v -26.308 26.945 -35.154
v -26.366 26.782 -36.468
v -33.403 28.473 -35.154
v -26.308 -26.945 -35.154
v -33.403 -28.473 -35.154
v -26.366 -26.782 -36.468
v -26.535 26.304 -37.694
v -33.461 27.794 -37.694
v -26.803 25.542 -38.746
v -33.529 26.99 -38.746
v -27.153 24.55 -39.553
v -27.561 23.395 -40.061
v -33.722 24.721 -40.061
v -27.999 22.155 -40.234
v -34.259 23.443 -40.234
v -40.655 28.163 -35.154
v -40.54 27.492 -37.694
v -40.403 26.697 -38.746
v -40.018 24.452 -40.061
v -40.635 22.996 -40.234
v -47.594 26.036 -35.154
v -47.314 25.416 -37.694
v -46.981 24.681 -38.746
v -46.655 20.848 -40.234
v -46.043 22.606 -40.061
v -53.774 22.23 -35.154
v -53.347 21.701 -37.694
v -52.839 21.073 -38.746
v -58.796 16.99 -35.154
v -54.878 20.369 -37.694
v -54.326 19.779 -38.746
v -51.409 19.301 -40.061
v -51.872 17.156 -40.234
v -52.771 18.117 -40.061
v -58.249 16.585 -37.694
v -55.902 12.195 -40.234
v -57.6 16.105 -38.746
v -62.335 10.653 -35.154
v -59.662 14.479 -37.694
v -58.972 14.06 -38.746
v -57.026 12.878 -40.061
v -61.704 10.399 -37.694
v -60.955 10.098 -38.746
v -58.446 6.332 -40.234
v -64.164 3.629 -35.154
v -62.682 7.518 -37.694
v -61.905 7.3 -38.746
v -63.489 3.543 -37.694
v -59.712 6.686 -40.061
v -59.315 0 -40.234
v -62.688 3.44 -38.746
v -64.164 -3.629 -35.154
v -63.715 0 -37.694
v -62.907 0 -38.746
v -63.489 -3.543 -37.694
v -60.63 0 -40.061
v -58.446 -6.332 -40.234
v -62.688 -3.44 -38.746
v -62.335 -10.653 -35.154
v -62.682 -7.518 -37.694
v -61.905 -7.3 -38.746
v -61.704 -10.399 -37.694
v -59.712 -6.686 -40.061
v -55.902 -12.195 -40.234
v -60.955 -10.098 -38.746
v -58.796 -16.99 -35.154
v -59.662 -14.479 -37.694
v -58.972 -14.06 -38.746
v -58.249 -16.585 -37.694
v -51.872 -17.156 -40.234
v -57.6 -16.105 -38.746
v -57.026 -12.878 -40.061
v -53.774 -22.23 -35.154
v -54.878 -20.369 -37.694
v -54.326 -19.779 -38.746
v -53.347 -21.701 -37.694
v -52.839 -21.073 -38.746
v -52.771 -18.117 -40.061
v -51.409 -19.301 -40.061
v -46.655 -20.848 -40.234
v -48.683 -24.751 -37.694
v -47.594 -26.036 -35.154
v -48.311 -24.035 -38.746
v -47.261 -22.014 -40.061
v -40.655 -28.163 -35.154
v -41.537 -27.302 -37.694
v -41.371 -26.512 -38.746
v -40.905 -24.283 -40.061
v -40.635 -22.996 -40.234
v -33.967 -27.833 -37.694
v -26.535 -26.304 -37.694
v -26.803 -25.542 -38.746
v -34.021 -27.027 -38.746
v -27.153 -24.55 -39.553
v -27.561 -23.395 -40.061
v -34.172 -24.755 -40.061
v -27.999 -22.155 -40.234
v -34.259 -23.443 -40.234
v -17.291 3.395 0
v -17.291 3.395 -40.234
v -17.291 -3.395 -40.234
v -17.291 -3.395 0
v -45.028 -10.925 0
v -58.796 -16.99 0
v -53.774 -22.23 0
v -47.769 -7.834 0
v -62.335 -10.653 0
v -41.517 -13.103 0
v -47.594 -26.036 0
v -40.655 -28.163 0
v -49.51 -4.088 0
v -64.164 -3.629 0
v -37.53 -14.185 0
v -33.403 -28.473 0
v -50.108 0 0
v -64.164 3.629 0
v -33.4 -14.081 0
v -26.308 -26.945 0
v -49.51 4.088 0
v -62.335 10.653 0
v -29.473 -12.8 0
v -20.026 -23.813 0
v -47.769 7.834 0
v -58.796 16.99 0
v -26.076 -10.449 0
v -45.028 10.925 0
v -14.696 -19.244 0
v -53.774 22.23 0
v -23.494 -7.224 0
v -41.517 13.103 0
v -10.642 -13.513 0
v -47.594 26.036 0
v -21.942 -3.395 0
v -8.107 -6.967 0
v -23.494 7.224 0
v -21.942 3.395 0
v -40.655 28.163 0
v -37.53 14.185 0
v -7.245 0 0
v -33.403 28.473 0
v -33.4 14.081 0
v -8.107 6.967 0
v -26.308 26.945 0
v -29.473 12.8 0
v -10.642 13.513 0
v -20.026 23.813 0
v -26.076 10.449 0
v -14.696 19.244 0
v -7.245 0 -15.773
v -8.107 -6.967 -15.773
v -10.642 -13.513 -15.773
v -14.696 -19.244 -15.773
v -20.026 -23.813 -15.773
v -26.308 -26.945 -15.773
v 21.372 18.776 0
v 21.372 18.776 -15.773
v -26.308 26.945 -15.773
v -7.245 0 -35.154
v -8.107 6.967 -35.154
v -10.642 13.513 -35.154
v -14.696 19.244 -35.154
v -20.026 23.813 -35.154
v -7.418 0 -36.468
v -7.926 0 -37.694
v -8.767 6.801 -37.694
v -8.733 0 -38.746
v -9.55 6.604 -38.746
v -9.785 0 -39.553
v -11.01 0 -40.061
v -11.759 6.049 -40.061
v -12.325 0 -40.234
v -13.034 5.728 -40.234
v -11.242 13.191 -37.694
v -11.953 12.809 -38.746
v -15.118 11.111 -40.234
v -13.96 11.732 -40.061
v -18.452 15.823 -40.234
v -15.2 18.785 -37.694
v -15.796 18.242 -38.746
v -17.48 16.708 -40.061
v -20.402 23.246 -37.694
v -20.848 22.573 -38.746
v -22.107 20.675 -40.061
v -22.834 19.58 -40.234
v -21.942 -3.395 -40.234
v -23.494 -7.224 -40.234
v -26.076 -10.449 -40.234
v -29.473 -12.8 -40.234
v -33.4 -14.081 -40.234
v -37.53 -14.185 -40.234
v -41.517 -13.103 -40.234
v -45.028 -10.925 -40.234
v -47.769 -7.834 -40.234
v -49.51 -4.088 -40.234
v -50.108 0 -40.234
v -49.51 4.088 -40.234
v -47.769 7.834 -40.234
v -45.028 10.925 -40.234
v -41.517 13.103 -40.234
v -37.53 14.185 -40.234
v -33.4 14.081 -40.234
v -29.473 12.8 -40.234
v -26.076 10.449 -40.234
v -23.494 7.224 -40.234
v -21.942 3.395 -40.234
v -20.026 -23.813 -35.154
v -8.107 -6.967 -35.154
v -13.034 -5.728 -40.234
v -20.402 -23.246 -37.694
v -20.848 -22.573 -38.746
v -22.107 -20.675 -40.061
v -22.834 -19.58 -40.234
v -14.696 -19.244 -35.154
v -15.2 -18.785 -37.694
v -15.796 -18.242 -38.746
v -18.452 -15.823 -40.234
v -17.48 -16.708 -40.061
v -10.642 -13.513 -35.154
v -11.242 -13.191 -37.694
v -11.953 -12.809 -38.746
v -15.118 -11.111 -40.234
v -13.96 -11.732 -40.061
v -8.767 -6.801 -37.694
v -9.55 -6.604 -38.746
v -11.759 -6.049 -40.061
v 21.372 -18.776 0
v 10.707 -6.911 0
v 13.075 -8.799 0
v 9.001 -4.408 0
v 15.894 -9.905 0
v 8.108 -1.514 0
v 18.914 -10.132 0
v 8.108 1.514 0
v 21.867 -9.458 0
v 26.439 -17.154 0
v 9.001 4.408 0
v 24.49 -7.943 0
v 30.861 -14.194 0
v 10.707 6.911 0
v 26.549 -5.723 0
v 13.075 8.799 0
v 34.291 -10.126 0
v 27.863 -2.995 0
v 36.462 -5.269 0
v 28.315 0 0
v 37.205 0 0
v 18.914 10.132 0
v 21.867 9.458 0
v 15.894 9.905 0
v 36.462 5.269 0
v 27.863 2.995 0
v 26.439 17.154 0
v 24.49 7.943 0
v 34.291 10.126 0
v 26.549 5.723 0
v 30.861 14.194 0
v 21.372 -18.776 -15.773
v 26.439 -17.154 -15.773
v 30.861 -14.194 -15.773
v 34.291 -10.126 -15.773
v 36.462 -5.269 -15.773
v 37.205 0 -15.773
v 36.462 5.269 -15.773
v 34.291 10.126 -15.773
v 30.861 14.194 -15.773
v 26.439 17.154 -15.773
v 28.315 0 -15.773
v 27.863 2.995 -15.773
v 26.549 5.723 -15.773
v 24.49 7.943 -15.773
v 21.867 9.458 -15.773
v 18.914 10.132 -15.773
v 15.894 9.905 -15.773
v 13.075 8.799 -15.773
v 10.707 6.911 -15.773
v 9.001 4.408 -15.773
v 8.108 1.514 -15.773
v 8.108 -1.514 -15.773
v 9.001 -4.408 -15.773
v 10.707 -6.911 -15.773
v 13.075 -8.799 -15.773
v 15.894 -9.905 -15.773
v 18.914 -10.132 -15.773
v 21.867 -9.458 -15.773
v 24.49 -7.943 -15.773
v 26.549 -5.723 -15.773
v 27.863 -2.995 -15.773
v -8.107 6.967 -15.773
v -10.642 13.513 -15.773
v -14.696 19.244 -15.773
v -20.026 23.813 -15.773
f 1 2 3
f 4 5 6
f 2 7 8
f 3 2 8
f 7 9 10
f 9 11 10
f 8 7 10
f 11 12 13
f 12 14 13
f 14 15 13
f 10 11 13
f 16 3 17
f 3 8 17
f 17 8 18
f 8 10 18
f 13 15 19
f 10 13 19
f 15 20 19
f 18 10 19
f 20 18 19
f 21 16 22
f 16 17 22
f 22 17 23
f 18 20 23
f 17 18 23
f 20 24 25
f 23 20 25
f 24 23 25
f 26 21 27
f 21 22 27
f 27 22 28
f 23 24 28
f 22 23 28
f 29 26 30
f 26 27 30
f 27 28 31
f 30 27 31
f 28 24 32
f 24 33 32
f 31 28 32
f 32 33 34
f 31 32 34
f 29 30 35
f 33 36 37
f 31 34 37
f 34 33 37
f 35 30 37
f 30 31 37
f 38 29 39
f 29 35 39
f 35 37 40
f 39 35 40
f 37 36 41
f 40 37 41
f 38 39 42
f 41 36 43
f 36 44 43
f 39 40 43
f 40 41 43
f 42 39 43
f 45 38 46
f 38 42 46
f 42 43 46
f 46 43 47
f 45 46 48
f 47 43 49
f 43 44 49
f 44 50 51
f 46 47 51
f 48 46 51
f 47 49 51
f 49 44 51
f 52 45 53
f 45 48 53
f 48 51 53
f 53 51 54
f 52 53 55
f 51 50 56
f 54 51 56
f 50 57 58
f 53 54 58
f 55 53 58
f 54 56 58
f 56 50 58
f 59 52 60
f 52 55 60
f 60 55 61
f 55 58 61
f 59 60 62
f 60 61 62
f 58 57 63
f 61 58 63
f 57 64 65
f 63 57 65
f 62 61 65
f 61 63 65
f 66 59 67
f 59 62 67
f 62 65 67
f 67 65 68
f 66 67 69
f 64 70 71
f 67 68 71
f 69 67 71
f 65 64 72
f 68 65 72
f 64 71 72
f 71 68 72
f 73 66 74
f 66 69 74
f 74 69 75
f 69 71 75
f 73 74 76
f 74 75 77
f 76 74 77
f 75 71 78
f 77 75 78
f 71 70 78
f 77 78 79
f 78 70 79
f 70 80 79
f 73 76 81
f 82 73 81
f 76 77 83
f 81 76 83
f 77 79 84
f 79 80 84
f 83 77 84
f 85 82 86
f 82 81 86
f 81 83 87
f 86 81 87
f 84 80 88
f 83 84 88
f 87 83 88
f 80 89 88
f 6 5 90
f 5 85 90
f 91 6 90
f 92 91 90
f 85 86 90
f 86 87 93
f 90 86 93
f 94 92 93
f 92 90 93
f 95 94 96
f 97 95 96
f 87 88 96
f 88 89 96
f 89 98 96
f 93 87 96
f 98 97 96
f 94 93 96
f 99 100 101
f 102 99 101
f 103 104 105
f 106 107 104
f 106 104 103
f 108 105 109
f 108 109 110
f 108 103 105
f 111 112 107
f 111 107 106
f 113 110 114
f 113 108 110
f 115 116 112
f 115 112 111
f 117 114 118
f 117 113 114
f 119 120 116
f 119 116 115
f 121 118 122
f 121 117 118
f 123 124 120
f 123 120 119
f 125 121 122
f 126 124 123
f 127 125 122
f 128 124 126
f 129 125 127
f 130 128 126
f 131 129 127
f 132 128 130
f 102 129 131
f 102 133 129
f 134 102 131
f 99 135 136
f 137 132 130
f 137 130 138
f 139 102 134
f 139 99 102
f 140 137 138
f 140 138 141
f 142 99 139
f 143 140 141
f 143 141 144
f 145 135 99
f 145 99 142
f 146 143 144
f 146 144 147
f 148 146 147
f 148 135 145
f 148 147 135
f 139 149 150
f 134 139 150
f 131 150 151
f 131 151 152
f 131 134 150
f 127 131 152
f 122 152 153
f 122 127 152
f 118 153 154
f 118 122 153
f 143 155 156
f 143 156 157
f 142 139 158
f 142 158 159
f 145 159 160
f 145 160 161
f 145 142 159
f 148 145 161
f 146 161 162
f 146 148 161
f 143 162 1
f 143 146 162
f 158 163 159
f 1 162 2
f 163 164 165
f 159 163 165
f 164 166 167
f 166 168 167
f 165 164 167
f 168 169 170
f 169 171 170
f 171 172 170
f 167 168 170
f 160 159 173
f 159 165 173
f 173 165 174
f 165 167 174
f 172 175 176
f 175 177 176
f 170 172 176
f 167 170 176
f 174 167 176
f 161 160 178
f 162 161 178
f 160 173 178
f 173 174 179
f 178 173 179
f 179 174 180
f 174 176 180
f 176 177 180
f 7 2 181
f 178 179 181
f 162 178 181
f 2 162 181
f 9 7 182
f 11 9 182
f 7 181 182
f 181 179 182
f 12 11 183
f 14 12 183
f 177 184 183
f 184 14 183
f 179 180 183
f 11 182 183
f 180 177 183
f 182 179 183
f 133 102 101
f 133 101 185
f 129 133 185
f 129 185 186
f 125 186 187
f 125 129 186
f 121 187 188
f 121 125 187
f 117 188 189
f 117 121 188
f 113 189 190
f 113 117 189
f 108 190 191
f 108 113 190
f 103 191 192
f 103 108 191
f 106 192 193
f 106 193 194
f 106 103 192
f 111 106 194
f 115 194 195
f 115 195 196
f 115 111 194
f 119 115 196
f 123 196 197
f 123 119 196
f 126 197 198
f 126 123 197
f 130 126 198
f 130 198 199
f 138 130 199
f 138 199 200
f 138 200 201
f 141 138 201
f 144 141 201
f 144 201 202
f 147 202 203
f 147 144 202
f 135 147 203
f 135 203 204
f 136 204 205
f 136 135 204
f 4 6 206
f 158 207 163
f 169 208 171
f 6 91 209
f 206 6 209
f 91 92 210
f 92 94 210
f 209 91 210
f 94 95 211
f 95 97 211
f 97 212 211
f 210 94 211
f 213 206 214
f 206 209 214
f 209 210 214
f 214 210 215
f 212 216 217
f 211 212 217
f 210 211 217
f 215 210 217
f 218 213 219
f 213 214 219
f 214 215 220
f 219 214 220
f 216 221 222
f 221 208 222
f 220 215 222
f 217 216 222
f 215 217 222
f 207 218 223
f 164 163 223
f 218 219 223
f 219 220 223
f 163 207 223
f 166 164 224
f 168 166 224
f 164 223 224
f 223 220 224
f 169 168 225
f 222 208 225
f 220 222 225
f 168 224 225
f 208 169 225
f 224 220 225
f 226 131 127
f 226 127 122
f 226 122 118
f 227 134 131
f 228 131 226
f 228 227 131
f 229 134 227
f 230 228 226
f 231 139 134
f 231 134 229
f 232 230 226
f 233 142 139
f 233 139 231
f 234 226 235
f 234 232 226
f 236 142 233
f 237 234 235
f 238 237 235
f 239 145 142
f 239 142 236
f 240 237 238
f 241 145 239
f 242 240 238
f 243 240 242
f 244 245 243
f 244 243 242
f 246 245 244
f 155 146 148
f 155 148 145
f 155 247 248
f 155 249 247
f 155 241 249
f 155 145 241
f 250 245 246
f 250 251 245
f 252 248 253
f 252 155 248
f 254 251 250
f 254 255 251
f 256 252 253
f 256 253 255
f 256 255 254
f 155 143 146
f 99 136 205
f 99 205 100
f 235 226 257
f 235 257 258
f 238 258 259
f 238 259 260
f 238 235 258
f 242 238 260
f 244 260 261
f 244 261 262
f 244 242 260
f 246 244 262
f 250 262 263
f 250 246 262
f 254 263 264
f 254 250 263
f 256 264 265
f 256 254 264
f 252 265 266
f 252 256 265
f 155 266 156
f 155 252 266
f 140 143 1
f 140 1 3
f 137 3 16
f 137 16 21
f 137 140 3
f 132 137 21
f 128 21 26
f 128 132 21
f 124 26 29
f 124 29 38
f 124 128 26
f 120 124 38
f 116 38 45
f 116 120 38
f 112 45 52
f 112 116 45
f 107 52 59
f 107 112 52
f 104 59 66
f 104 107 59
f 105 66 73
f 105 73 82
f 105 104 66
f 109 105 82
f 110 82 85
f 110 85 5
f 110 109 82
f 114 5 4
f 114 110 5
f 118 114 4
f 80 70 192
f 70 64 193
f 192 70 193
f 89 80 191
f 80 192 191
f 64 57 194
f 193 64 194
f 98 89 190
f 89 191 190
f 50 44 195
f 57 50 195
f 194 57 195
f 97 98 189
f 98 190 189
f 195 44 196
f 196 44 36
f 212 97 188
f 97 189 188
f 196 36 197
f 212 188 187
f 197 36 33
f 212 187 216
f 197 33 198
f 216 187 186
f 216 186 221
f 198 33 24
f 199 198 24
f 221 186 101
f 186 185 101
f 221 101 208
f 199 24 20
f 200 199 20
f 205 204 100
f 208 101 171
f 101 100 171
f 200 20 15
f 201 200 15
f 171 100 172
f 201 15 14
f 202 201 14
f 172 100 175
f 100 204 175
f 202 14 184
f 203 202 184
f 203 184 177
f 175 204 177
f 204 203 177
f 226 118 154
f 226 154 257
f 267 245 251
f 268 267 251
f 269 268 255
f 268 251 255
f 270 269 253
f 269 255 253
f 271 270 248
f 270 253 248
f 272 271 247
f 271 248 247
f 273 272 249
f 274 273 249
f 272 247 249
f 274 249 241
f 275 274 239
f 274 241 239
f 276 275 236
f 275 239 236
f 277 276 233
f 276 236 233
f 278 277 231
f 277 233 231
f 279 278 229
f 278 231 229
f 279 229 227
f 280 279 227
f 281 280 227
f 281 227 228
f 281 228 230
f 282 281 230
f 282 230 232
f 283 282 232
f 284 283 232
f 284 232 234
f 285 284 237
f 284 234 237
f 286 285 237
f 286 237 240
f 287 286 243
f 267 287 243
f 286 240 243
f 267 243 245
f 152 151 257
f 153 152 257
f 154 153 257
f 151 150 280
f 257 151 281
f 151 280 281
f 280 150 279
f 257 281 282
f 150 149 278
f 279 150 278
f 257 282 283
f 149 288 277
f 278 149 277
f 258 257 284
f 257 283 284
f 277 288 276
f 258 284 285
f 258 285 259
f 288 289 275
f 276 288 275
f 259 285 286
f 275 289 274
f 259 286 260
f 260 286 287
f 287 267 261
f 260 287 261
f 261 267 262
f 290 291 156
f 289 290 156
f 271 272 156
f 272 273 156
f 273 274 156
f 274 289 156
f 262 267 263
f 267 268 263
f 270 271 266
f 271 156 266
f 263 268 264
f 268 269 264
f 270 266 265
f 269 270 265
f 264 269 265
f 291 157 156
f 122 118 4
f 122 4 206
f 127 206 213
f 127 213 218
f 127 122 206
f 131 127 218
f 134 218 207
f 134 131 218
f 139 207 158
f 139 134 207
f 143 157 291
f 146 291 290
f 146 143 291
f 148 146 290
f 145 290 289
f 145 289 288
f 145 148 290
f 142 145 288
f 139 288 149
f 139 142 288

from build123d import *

# Parameters (mm, degrees)
F0_R     = 25.4384663116
F1_DEPTH = 40.2336
F0_R_2   = 10.16
F2_DEPTH = 15.7734
F3_R     = 5.08


with BuildPart() as f1:
    # F0 (on Top) → F1 (new body)
    with BuildSketch(Plane.XY):
        with BuildLine():
            ThreePointArc((-26.3079627686, -26.9452959039), (-12.4926817167, -16.5033322905), (-7.2451472522, 0))
            ThreePointArc((-7.2451472522, 0), (-12.4926817167, 16.5033322905), (-26.3079627686, 26.9452959039))
            ThreePointArc((-26.3079627686, 26.9452959039), (-64.3951472522, 0), (-26.3079627686, -26.9452959039))
        make_face()
        with Locations((-35.8201472522, 0)):
            Circle(F0_R, mode=Mode.SUBTRACT)
        with Locations((-35.8201472522, 0)):
            Circle(F0_R)
        with BuildLine():
            ThreePointArc((-21.9419522094, -3.395343665), (-50.1076472522, 0), (-21.9419522094, 3.395343665))
            Line((-21.9419522094, 3.395343665), (-17.2908472522, 3.395343665))
            Line((-17.2908472522, 3.395343665), (-17.2908472522, -3.395343665))
            Line((-17.2908472522, -3.395343665), (-21.9419522094, -3.395343665))
        make_face(mode=Mode.SUBTRACT)
    extrude(amount=-F1_DEPTH)

    # F3
    f3_edges = [f1.edges().sort_by_distance(p)[0] for p in [
        (-64.395147, 0, -40.2336),
    ]]
    fillet(f3_edges, radius=F3_R)


with BuildPart() as f2:
    # F0 (on Top) → F2 (new body)
    with BuildSketch(Plane.XY):
        with BuildLine():
            ThreePointArc((-26.3079627686, 26.9452959039), (-12.4926817167, 16.5033322905), (-7.2451472522, 0))
            ThreePointArc((-7.2451472522, 0), (-12.4926817167, -16.5033322905), (-26.3079627686, -26.9452959039))
            Line((-26.3079627686, -26.9452959039), (21.3717800099, -18.7764181619))
            ThreePointArc((21.3717800099, -18.7764181619), (37.2048527478, 0), (21.3717800099, 18.7764181619))
            Line((21.3717800099, 18.7764181619), (-26.3079627686, 26.9452959039))
        make_face()
        with Locations((18.1548527478, 0)):
            Circle(F0_R_2, mode=Mode.SUBTRACT)
    extrude(amount=-F2_DEPTH)


solid = Compound([f1.part, f2.part])
